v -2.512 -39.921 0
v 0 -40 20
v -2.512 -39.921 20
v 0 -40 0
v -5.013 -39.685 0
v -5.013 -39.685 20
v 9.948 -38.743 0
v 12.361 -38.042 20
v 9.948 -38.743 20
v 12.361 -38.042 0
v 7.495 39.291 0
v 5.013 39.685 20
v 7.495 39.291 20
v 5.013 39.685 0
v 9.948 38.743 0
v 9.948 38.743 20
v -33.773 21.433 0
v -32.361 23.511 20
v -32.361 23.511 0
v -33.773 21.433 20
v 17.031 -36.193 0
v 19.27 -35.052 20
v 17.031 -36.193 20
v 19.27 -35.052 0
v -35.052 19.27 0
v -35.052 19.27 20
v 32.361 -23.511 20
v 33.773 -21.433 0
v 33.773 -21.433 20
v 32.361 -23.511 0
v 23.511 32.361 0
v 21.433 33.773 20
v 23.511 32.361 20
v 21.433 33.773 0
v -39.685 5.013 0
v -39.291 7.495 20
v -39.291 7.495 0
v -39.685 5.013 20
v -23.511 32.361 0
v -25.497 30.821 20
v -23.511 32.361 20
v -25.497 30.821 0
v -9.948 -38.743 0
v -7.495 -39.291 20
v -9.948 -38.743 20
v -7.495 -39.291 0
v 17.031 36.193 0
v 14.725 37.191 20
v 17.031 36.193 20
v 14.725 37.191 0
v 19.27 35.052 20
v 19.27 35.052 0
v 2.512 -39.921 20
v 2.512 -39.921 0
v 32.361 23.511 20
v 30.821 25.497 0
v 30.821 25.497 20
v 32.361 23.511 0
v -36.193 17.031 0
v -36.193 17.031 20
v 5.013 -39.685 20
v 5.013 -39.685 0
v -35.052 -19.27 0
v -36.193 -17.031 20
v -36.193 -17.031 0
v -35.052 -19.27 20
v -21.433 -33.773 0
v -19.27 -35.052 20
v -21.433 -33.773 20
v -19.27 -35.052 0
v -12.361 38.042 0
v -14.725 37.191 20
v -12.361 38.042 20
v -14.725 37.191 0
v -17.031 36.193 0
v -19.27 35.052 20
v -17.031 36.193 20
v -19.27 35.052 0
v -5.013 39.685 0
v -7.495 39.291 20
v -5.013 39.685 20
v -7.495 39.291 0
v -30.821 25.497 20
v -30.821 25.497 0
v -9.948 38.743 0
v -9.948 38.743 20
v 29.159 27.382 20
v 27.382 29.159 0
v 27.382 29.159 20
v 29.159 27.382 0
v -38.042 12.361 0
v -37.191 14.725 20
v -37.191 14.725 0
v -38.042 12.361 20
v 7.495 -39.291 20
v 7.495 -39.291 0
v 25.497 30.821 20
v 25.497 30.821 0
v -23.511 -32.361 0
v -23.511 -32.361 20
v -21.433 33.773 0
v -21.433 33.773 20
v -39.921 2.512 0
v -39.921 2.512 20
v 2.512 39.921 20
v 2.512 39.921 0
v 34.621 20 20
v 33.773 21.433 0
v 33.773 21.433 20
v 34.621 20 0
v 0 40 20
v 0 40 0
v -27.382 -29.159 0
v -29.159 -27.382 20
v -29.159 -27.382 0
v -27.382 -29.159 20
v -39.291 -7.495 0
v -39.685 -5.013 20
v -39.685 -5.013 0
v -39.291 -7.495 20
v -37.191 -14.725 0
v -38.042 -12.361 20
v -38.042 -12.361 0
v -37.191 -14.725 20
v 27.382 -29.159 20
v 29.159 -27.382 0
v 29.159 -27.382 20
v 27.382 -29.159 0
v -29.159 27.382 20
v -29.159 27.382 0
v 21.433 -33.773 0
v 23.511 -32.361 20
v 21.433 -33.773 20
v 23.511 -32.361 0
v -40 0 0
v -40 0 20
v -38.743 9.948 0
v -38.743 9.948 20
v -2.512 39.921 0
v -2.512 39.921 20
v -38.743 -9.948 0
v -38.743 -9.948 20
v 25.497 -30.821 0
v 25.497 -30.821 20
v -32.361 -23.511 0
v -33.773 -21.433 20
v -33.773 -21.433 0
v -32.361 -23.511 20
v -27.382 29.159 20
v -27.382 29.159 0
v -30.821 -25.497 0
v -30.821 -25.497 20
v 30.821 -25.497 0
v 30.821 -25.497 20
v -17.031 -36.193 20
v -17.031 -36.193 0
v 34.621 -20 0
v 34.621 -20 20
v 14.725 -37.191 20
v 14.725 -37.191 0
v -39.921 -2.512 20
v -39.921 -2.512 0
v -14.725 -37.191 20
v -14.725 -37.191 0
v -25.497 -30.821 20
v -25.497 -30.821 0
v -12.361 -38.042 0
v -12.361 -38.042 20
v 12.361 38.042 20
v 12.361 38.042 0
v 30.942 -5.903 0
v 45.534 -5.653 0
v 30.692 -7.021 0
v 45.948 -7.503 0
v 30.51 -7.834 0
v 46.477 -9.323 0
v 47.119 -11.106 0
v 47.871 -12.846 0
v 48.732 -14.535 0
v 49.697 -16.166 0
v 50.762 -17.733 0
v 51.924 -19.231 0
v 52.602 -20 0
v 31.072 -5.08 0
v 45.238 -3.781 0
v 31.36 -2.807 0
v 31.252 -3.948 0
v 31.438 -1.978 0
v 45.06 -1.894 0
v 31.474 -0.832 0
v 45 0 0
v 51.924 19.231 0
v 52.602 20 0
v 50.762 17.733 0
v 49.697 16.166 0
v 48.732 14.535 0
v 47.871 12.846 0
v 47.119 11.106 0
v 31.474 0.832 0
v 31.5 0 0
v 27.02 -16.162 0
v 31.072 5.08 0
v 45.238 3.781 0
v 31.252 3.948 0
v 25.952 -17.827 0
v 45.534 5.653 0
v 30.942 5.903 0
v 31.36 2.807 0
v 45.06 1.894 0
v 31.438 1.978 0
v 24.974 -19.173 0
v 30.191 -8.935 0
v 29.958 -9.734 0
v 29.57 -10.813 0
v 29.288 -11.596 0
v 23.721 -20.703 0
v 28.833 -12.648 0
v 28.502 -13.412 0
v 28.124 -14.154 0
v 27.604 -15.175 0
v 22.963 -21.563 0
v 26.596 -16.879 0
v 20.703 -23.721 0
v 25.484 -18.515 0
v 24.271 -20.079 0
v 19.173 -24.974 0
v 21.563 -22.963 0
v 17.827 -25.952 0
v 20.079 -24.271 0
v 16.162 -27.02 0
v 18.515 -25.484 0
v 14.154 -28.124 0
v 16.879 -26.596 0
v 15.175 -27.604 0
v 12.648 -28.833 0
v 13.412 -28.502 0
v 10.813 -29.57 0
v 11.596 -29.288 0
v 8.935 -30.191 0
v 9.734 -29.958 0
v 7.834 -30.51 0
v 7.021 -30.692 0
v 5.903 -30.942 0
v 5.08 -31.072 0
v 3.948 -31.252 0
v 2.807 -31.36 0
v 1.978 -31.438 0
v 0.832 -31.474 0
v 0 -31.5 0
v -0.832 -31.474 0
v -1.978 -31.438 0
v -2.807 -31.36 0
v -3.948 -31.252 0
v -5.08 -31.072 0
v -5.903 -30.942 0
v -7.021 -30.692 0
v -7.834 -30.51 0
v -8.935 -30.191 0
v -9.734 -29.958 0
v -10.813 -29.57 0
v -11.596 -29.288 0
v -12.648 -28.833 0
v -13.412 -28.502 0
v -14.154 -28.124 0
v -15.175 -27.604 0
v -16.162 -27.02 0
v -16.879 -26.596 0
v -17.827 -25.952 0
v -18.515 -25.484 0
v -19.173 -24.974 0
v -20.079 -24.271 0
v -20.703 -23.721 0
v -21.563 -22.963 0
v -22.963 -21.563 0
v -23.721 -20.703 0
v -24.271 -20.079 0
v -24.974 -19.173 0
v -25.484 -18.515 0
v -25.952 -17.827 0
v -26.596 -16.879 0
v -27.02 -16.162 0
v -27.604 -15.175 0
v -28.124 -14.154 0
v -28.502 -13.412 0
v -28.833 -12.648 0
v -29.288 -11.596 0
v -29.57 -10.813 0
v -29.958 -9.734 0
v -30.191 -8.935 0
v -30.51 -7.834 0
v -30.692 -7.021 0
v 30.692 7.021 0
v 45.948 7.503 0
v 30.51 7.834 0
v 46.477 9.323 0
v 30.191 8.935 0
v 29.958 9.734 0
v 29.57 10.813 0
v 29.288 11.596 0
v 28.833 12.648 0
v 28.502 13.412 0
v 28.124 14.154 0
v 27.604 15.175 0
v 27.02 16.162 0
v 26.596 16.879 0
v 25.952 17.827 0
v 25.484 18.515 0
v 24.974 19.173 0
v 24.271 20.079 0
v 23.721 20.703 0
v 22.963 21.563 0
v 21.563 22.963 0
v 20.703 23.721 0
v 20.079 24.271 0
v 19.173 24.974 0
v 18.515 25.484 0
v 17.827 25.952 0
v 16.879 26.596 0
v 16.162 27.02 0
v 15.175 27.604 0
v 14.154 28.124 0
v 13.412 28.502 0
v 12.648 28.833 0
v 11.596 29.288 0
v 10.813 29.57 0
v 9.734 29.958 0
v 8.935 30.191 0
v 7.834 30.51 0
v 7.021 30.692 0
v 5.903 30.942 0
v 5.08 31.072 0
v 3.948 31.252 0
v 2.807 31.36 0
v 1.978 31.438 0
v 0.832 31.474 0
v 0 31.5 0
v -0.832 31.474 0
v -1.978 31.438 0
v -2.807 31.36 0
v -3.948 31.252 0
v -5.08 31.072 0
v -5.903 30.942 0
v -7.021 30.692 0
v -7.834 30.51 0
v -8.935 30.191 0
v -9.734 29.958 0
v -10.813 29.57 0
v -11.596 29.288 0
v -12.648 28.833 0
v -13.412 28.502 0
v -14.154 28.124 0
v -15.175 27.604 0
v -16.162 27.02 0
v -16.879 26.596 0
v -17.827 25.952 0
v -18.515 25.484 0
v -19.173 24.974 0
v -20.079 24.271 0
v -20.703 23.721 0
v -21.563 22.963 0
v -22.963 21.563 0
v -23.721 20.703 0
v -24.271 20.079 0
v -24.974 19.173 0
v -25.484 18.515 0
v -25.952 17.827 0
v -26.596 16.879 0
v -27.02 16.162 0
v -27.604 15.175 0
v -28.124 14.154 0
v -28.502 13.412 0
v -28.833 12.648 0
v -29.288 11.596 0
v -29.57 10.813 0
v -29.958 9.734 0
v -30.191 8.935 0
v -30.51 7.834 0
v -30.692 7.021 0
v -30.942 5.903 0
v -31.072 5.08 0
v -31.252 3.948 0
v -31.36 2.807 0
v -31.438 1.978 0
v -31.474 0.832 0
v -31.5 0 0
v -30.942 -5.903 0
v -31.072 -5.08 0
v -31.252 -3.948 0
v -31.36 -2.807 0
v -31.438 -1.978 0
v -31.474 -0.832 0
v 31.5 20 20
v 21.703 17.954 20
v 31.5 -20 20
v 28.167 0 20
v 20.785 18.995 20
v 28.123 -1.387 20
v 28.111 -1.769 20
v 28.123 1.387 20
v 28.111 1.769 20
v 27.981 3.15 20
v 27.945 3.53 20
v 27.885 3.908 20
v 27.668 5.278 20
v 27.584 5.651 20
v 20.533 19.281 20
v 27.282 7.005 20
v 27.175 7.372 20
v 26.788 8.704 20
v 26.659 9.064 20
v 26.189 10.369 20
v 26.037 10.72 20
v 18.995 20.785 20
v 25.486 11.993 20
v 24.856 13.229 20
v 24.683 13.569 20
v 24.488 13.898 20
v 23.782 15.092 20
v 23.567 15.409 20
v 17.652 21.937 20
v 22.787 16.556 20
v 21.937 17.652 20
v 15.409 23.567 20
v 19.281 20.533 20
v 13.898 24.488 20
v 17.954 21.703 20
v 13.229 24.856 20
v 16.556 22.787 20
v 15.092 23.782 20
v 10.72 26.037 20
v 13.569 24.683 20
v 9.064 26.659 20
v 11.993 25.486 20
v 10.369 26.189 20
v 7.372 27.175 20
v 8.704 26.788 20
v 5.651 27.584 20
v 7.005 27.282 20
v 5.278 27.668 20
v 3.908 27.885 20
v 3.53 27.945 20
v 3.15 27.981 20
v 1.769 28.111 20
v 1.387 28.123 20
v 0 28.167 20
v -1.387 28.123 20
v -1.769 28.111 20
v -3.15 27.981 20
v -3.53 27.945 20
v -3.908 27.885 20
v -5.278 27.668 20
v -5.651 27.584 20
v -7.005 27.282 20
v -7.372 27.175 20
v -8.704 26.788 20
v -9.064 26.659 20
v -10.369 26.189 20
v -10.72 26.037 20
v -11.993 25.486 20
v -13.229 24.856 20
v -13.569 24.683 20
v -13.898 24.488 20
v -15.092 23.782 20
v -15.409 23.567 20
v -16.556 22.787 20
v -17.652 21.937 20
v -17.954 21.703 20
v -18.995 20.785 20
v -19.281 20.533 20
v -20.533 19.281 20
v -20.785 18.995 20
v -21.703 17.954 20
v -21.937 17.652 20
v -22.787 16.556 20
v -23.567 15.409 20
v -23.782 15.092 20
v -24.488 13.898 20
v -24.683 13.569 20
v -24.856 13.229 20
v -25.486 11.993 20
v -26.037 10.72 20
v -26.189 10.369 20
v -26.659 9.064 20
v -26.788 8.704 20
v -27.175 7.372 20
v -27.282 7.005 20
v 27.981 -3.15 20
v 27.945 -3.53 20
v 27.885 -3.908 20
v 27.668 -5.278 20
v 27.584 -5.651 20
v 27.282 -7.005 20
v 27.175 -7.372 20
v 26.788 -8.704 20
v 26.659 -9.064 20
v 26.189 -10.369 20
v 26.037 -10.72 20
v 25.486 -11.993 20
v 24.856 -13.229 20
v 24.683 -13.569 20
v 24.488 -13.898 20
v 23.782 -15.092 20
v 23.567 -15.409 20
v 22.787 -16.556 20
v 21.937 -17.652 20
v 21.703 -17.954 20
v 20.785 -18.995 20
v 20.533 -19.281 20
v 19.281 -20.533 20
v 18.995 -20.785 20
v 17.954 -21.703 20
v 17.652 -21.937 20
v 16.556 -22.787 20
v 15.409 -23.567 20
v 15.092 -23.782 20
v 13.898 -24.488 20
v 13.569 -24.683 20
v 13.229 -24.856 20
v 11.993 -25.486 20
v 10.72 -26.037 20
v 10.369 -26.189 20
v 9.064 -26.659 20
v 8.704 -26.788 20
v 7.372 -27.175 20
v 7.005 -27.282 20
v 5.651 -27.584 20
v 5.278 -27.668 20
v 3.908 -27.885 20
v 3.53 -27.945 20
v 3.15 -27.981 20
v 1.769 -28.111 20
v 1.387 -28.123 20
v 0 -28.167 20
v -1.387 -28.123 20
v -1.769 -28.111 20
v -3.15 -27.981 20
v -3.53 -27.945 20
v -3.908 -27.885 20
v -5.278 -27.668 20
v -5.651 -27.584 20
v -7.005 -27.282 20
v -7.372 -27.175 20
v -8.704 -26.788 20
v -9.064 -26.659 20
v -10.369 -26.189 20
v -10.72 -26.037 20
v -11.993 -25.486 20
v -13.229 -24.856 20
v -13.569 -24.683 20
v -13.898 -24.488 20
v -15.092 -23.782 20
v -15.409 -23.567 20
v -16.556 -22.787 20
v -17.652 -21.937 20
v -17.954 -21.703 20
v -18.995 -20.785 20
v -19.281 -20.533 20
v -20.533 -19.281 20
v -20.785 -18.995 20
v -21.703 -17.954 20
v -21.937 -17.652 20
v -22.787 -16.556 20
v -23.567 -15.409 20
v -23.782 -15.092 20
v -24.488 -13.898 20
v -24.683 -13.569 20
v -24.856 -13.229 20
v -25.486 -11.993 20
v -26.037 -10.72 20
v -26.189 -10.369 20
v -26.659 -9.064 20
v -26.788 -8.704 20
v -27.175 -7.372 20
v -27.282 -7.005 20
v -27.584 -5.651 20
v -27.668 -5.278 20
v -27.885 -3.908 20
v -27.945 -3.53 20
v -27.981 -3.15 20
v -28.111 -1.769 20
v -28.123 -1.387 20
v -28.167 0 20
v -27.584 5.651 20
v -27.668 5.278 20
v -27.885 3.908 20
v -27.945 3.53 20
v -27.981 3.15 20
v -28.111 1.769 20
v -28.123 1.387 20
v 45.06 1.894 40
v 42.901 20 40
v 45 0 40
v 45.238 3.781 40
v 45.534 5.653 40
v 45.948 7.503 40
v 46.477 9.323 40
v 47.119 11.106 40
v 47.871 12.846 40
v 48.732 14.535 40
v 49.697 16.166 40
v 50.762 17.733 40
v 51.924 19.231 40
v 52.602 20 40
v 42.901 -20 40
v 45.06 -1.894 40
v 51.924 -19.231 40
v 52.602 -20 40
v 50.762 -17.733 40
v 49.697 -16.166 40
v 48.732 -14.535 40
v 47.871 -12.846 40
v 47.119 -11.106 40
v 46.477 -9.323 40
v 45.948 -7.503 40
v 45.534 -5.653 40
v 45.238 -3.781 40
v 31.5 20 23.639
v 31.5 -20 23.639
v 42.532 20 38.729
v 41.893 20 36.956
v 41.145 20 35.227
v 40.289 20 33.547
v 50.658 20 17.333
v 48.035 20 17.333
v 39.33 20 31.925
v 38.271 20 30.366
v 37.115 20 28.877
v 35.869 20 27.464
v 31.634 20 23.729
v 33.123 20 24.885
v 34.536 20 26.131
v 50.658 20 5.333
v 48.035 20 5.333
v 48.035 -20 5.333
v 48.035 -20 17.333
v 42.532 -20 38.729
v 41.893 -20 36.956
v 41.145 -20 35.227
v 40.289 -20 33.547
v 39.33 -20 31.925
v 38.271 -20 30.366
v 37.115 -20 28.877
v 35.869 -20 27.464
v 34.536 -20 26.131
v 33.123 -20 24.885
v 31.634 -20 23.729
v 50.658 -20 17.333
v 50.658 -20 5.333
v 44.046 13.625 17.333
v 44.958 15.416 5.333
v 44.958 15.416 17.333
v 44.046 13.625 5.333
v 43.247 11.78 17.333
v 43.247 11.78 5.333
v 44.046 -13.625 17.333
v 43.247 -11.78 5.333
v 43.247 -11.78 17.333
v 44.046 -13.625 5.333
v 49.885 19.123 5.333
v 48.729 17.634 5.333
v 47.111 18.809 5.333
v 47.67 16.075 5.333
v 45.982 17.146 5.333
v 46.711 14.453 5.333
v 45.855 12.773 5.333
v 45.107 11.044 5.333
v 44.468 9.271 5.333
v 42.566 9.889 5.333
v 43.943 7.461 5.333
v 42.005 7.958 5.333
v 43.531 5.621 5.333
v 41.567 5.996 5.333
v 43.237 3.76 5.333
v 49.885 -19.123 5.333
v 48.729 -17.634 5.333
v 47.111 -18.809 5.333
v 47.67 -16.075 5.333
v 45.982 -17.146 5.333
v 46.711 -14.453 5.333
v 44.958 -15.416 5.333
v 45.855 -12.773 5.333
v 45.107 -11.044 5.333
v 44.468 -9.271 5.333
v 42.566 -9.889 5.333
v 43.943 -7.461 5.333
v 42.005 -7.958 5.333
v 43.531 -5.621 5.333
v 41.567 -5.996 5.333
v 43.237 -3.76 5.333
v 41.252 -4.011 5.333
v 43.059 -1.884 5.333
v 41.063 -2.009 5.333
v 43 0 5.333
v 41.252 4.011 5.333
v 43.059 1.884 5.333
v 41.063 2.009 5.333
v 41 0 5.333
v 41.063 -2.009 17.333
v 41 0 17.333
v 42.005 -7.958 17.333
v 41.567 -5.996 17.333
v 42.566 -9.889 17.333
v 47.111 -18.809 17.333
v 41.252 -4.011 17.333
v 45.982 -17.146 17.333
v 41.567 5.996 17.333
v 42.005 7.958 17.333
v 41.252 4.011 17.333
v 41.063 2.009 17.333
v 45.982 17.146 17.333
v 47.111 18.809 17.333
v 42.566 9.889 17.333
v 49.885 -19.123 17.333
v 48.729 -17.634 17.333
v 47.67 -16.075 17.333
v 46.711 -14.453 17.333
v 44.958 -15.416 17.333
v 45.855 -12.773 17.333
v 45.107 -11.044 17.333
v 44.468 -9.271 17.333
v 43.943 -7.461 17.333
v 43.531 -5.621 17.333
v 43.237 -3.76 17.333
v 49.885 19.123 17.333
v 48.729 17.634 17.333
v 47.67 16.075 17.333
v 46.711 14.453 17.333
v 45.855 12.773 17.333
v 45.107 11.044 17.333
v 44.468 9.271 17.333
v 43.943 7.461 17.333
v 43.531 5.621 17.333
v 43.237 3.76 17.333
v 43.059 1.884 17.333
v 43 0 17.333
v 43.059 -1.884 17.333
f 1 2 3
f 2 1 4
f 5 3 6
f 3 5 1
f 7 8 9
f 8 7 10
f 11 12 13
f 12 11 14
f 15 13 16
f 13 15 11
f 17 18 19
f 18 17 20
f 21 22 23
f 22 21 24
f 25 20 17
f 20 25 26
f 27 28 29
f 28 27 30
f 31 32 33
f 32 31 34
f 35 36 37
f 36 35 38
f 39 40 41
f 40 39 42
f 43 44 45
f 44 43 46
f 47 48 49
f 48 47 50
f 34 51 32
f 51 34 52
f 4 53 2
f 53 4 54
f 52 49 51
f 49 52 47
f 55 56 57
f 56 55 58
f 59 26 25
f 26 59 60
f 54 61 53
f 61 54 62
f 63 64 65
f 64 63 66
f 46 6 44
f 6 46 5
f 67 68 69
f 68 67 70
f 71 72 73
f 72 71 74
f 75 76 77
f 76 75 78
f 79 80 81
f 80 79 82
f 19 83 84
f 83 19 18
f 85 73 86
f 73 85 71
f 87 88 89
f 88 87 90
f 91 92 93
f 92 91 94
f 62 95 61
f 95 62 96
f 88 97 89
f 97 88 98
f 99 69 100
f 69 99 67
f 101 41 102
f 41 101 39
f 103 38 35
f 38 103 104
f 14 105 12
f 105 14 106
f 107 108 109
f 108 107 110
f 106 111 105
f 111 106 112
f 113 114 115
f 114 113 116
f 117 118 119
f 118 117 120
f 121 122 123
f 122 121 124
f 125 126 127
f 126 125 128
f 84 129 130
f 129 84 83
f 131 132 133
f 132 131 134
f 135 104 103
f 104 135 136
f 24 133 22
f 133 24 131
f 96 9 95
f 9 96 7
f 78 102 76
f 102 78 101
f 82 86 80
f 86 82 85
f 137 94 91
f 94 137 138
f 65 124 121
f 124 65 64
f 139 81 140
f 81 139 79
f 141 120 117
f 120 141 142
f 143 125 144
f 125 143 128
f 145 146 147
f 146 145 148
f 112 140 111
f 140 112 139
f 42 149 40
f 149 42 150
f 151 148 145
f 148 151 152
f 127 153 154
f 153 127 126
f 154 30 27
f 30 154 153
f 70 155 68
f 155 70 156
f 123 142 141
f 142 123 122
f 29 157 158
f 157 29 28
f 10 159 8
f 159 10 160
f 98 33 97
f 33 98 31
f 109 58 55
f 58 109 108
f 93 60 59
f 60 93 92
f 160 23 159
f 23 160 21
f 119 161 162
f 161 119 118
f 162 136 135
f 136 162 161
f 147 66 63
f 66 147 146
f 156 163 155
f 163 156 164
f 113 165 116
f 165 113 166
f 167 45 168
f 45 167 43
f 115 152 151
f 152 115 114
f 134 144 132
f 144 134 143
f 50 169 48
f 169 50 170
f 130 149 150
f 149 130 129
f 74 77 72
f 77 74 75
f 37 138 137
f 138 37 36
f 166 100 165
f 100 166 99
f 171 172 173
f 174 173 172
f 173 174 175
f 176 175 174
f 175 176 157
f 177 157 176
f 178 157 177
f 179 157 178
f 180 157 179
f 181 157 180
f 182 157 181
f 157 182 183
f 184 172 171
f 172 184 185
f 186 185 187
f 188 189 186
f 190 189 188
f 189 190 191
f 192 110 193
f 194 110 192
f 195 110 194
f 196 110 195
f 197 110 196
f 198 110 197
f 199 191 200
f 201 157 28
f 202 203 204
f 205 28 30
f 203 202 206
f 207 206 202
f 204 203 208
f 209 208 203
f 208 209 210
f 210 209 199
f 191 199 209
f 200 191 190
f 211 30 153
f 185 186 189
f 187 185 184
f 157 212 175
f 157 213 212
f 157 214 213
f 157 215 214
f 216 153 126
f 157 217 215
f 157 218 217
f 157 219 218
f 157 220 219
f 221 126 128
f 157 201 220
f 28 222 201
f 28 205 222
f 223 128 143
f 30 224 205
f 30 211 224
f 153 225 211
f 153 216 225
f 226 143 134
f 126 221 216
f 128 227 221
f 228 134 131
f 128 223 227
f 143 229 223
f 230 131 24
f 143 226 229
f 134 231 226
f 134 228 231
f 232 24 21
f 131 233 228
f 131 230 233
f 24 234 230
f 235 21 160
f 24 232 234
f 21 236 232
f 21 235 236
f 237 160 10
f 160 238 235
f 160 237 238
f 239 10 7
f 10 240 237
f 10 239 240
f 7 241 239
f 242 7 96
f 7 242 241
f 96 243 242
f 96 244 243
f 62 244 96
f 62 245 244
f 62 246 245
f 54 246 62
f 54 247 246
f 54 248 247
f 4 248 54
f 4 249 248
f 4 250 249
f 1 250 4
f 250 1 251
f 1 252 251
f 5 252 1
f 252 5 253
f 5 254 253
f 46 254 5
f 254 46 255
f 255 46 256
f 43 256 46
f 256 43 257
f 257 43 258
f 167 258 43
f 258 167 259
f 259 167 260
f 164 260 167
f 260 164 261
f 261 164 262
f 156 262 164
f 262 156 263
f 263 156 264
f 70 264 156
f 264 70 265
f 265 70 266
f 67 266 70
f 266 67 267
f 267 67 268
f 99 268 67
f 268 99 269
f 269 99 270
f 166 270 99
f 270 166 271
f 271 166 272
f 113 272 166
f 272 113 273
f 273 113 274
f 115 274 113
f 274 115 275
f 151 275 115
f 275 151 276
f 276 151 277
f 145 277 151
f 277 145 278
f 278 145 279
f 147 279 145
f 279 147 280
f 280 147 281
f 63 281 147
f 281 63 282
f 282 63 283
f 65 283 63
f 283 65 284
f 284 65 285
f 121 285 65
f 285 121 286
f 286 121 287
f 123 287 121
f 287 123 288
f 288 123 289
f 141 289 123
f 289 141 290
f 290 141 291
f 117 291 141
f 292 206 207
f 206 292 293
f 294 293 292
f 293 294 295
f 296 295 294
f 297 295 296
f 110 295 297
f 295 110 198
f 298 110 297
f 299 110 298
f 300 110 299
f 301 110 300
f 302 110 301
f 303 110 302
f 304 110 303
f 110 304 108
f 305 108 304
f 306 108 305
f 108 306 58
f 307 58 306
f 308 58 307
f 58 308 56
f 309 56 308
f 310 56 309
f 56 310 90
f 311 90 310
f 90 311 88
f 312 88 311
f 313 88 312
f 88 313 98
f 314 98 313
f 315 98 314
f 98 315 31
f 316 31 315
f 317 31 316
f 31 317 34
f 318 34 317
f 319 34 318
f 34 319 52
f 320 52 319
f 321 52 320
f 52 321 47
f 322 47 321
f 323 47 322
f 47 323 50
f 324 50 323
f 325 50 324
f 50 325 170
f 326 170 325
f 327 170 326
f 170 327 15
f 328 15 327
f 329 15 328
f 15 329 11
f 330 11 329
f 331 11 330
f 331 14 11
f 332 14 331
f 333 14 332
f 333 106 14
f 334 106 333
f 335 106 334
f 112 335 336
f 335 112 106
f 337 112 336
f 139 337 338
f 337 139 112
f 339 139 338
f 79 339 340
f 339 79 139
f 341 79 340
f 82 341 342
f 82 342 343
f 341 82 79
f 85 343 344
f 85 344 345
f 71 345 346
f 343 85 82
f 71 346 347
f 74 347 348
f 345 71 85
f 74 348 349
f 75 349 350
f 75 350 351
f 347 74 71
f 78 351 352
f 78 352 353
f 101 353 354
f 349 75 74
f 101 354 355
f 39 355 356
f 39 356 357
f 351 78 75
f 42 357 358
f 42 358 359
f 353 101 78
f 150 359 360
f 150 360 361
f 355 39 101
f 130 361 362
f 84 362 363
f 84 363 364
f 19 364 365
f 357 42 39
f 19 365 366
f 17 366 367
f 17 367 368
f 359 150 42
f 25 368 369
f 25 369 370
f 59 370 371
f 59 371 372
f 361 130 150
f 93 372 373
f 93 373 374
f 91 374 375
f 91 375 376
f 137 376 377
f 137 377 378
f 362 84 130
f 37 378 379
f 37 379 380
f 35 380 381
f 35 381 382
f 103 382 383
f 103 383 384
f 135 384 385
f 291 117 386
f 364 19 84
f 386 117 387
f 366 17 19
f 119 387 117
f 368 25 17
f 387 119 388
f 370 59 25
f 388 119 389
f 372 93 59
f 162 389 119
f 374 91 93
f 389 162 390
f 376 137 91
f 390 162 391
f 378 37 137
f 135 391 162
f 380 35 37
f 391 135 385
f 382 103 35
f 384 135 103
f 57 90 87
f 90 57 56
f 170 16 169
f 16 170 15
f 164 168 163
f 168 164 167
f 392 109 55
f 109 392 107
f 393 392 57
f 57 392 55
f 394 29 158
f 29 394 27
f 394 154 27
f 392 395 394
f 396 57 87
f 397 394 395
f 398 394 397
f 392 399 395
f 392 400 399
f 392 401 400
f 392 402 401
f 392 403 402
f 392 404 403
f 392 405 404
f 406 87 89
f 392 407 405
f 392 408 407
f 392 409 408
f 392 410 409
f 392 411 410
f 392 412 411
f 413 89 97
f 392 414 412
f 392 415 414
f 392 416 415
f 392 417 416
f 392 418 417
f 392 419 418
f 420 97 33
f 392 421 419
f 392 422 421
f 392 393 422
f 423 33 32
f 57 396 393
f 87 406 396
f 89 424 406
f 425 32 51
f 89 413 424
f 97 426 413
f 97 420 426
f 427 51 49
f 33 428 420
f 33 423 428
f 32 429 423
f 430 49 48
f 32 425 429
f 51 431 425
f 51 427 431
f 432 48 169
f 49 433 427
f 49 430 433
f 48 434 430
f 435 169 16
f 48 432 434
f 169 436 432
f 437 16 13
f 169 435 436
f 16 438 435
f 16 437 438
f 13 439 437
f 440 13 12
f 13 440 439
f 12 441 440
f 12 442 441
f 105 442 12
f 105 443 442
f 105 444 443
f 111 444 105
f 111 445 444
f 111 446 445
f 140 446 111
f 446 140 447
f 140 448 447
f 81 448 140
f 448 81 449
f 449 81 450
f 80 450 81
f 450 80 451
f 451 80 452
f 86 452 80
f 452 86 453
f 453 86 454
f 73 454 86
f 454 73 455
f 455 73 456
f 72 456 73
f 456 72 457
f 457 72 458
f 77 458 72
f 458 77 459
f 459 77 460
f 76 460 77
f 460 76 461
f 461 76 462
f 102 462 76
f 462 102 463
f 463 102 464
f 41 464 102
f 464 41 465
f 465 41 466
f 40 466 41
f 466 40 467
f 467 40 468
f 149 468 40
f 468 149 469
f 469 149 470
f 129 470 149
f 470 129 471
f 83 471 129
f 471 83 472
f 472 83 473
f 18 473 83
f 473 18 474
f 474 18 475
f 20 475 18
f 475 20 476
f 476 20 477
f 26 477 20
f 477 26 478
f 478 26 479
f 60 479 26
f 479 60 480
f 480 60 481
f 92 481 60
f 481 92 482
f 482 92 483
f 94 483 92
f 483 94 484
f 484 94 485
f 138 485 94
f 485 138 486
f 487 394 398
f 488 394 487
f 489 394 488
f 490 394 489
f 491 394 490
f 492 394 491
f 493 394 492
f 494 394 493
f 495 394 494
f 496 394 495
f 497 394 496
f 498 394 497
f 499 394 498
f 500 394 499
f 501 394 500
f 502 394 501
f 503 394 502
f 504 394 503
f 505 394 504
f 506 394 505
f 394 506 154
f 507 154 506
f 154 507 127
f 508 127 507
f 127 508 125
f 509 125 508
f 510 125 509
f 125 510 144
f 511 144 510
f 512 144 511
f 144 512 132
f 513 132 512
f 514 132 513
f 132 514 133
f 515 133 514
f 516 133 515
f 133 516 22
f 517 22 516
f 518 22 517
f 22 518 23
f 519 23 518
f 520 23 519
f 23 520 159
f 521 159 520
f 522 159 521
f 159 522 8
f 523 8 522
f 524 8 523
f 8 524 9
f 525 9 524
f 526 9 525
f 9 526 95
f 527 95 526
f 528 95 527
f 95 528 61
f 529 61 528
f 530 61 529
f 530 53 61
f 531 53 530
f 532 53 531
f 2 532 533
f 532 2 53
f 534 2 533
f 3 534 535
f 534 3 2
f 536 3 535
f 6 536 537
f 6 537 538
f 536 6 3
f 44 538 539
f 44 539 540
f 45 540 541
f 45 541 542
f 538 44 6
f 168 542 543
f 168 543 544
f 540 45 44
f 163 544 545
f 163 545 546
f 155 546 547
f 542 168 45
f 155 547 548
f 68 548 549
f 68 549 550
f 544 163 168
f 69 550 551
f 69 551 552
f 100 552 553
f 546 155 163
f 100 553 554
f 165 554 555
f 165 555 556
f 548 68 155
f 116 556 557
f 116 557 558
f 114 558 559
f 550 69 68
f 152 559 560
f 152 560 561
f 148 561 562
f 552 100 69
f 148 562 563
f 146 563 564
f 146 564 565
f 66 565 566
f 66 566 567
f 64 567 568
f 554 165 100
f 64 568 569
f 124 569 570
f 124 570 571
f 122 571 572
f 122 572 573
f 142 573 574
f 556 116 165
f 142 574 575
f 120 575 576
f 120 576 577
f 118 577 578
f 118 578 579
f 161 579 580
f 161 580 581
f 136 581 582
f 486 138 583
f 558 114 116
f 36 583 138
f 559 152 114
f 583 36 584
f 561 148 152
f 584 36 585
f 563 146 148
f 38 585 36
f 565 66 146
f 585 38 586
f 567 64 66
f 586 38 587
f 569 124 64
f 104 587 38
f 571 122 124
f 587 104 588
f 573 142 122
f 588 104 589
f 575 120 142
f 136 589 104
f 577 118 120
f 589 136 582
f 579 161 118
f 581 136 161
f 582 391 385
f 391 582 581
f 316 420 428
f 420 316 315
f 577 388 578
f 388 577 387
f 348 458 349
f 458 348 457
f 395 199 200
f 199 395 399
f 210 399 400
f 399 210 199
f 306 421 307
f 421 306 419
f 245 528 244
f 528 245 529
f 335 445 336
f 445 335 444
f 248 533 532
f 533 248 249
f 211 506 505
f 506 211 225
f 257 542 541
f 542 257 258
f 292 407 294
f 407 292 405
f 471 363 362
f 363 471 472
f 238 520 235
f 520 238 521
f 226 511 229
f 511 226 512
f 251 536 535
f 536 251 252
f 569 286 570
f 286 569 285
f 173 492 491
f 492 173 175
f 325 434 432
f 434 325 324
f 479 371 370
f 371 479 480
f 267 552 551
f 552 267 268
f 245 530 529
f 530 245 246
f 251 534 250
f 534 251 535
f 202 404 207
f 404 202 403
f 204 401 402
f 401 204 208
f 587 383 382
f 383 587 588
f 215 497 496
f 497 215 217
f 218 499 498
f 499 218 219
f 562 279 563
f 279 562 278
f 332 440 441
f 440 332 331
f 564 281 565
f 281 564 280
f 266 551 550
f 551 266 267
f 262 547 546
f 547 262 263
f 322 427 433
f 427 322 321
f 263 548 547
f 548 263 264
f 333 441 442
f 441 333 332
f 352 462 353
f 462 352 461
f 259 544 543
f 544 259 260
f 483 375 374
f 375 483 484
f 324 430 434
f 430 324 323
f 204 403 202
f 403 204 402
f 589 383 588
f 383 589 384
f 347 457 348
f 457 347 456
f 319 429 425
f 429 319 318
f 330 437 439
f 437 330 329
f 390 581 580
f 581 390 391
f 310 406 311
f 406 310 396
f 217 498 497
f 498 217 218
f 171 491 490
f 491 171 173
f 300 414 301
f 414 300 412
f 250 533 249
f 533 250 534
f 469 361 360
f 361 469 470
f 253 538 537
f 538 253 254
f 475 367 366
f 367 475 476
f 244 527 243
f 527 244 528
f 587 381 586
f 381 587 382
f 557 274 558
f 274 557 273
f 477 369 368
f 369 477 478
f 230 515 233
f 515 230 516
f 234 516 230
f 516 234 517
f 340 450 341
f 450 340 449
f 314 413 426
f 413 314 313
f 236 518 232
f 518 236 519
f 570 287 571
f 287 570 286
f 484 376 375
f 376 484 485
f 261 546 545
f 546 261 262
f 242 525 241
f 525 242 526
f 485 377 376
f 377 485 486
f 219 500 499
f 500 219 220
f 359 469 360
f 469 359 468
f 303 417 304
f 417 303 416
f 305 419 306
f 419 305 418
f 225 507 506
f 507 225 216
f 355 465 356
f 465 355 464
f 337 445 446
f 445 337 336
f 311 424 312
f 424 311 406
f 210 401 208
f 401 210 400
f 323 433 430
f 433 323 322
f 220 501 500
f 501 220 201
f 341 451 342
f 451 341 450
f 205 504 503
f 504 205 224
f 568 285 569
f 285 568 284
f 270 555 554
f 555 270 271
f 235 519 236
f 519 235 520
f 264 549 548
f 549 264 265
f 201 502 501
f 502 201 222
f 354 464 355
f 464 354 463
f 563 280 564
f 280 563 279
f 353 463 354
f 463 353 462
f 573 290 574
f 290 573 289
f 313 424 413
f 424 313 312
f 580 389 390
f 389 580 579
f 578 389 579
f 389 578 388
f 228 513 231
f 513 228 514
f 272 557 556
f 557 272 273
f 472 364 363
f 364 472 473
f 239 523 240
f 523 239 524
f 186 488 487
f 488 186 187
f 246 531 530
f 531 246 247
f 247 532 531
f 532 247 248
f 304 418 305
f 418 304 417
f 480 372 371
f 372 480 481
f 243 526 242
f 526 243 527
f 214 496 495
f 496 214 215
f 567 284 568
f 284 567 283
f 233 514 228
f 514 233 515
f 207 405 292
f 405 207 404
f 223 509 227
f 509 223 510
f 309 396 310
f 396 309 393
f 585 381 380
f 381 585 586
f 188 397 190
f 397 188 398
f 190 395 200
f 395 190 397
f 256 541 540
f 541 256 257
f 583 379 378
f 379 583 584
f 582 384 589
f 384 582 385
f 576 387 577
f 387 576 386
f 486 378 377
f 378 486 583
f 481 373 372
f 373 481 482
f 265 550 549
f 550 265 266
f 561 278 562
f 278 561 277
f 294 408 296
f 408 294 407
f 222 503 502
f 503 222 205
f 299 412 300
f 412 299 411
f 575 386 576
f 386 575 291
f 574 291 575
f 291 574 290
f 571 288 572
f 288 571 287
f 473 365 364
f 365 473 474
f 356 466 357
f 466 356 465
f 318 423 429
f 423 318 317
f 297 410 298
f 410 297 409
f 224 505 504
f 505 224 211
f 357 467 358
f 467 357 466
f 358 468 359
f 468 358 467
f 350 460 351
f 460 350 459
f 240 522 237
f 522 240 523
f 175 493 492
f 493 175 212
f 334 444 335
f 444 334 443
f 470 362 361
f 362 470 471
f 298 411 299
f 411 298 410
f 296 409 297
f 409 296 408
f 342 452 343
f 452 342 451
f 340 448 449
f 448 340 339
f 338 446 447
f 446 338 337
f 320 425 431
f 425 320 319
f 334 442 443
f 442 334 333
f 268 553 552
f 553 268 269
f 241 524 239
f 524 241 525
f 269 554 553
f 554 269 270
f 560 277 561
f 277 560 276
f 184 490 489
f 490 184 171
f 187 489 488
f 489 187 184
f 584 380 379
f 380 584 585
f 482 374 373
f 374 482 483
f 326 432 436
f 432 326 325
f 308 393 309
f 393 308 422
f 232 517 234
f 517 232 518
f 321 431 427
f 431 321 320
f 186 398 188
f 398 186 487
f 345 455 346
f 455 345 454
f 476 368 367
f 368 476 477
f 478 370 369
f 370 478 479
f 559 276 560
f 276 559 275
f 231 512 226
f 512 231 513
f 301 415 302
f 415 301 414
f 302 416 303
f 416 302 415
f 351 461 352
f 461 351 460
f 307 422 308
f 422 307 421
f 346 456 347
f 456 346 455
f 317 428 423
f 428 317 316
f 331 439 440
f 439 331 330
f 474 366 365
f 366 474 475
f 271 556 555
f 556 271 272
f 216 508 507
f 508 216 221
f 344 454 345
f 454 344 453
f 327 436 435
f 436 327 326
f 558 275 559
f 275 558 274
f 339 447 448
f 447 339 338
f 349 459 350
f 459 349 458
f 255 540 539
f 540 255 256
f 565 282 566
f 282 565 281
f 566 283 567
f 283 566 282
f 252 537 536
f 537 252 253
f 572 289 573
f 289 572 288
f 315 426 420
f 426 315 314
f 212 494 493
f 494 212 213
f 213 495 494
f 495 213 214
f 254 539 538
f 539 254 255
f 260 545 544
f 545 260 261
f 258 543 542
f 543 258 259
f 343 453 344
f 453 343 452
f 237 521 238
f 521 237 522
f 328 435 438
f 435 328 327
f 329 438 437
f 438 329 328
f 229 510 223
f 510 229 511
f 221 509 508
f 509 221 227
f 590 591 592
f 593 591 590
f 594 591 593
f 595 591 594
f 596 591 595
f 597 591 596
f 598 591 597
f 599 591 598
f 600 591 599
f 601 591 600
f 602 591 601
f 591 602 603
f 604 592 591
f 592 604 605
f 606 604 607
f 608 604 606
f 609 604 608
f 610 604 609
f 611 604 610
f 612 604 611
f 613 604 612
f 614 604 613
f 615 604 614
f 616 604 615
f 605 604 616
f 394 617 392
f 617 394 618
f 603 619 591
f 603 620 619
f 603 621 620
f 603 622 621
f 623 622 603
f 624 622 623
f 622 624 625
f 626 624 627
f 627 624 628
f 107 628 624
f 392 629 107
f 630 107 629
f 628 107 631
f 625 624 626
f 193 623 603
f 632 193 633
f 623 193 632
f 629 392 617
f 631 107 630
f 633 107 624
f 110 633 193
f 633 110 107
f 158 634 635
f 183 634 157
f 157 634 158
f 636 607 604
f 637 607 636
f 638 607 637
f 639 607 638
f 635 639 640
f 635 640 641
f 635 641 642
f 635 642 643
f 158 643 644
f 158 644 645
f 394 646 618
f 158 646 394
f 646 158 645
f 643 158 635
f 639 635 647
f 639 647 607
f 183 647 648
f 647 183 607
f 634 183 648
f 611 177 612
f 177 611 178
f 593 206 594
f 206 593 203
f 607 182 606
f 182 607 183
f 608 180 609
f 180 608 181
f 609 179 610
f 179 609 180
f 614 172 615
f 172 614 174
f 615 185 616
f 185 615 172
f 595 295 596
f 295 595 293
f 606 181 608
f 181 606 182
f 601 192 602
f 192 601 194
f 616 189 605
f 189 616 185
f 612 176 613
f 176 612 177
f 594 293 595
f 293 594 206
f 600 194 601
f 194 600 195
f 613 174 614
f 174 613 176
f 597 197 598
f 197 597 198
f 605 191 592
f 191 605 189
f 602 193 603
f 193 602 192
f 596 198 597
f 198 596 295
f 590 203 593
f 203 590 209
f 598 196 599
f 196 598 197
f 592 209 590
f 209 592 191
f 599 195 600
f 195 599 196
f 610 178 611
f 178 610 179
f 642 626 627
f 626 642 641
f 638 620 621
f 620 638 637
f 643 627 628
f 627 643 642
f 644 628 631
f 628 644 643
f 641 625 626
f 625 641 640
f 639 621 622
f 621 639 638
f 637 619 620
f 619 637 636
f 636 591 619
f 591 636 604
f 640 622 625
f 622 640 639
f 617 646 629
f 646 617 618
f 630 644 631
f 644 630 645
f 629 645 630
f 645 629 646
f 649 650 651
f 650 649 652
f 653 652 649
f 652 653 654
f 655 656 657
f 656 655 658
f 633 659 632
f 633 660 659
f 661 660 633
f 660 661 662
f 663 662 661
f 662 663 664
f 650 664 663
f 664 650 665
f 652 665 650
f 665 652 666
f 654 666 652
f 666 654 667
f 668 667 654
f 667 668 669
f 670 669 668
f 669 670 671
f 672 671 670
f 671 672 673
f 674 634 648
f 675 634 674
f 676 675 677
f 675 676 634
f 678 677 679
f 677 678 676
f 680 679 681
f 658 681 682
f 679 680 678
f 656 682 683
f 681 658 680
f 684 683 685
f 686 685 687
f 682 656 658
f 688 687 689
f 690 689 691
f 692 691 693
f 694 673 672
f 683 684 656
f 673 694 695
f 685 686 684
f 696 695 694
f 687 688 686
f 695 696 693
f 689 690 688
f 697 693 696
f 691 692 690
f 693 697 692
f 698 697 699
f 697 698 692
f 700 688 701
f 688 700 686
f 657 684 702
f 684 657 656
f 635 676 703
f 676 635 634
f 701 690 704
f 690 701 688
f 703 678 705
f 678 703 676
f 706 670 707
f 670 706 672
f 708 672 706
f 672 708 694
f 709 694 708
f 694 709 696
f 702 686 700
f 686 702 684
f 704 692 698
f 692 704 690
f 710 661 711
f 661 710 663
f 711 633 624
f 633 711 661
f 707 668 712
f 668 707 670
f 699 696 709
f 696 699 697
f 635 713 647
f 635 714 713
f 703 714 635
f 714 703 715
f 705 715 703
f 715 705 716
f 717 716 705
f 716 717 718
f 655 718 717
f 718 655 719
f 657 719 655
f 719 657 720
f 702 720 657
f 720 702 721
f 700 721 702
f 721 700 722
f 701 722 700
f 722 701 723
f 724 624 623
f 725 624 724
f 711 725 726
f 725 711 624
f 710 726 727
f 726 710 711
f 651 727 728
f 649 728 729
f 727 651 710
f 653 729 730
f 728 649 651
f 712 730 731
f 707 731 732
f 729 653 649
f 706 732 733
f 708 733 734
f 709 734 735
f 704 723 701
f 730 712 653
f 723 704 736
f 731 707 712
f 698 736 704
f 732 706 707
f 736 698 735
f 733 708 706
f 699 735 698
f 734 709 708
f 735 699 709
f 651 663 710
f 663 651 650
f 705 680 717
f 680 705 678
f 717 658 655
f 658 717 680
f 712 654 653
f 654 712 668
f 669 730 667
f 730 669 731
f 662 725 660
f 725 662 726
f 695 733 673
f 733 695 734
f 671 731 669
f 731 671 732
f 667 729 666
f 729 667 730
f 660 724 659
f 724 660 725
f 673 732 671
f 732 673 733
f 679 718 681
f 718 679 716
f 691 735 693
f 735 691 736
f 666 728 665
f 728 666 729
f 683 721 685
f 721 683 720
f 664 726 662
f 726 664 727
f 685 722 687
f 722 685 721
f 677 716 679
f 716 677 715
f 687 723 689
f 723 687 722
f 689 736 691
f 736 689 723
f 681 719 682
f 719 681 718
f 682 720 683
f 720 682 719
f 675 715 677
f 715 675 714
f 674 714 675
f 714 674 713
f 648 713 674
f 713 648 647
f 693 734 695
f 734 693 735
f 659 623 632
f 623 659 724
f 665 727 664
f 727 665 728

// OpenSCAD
/* NOTES:
	writecylinder(text="text",where=[0,0,0],radius=20,height=40);
	
	Required Parameters (If supplied in this order, identifier is not required)
		text="text"	 	: Text to be written
		where=[x,y,z]	: coordinates of cylinder
		radius=mm 		: radius of cylinder
		height=mm 		: height of cylinder

	Optional Parameter:
		center=boolean :	use this to specify that cylinder is centered on coordinates
					(default is center=false)
		face="top" : Top of cylinder
		face="bottom": bottom of cylinder
		face="front" :barrel of cylinder (default if not supplied)	

	Optional Parameters: (face is not "top" or "bottom")
		east=degrees : west= degrees: (moves text east or west around z)
		up=mm or down=mm : moves text up or down along Z axis
		rotate=degrees : rotates text around Y axis (spirals around cylinder)
	
	Optional Parameters: (face="top" or face="bottom")
		east=degrees or west=degrees : rotate text east or west around top
		rotate=degrees : (similar to east west but not dependant on text orientation)
		ccw=boolean : If true, writes in a counter clockwise direction. (default=false)
		middle=mm :moves the text ?mm toward center of top or bottom surface 	

*/

use <WriteSVG.scad>


 //-- Parmetros del vaso
/* grosor = 20;
 diam_ext=80;
 diam_int = 63.3; 
 texto = "Gonzalo";
diam_tubo = 60;
*/

// Aro
module aro(grosor_aro=20,  diam_ext=80, diam_int = 63.3, texto = "Gonzalo")
{
 // Exterior Aro
 difference(){
  difference() {
     //-- Base de la rueda
    cylinder(r=diam_ext/2,h=grosor_aro,  $fn=100);
	rotate([0,180,-90])
	translate([0,0,-20])
    	writecylinder(texto,[0,0,0],diam_ext/2-0.7,grosor_aro);
   } 

    //-- Taladro aro
   cylinder(r1=diam_int/2+5, r2=diam_int/2-5,h=grosor_aro*3,$fn=100,center=true);
 }
}

//Base asa
module base_asa(altura=40, diam_int = 63.3, diam_ext=80, diam_tubo = 60)
{
difference(){
difference(){
 translate([diam_int/2,-20,0])
 cube([30,40,altura]);

translate([(diam_ext+diam_tubo)/2+5,0,altura/2])
  cylinder(r=diam_tubo/2, h=altura*2,$fn=100,center=true);
}

translate([14,21,48])
rotate([90,0,0])
cylinder(r=60/2,h=42,  $fn=100);
}
}

//Cuerpdel soporte del vaso
module cuerpo_sv(grosor_aro=20,  diam_ext=80, diam_int = 63, texto = "Gonzalo",altura=40, diam_tubo = 60.34){
 aro(grosor_aro,  diam_ext, diam_int, texto);
 base_asa(altura, diam_int, diam_ext, diam_tubo);
}

module agarradera( diam_ext=80, diam_int = 63.3, altura_ag=12, ancho_ag=2, diam_tubo = 60){
difference(){
  	translate([(diam_ext+diam_tubo)/2+3,0,0])
	cylinder(r=diam_tubo/2+ancho_ag, h=altura_ag,$fn=100);

  	translate([(diam_ext+diam_tubo)/2+3,0,-altura_ag*2])
	cylinder(r=diam_tubo/2, h=altura_ag*4,$fn=100);
}
}

module agarraderas( altura_asa=40, diam_ext=80, diam_int = 63.3, altura_ag=12, ancho_ag=2, diam_tubo = 60){
separacion=(altura_asa-altura_ag*2)/3;
translate([0,0,separacion])
agarradera(diam_ext, diam_int , altura_ag, ancho_ag, diam_tubo );

// Una agarradera es suficiente. La de más abajo no es necesaria
/*translate([0,0,separacion*2+altura_ag])
agarradera(diam_ext, diam_int , altura_ag, ancho_ag, diam_tubo );
*/
}

module soporte_vaso(){
	difference(){	
		cuerpo_sv();
		agarraderas();
	}
}
/*difference(){	
soporte_vaso();
color("Red")
translate([14,21,48])
rotate([90,0,0])
cylinder(r=60/2,h=42,  $fn=100);
}*/

soporte_vaso();
